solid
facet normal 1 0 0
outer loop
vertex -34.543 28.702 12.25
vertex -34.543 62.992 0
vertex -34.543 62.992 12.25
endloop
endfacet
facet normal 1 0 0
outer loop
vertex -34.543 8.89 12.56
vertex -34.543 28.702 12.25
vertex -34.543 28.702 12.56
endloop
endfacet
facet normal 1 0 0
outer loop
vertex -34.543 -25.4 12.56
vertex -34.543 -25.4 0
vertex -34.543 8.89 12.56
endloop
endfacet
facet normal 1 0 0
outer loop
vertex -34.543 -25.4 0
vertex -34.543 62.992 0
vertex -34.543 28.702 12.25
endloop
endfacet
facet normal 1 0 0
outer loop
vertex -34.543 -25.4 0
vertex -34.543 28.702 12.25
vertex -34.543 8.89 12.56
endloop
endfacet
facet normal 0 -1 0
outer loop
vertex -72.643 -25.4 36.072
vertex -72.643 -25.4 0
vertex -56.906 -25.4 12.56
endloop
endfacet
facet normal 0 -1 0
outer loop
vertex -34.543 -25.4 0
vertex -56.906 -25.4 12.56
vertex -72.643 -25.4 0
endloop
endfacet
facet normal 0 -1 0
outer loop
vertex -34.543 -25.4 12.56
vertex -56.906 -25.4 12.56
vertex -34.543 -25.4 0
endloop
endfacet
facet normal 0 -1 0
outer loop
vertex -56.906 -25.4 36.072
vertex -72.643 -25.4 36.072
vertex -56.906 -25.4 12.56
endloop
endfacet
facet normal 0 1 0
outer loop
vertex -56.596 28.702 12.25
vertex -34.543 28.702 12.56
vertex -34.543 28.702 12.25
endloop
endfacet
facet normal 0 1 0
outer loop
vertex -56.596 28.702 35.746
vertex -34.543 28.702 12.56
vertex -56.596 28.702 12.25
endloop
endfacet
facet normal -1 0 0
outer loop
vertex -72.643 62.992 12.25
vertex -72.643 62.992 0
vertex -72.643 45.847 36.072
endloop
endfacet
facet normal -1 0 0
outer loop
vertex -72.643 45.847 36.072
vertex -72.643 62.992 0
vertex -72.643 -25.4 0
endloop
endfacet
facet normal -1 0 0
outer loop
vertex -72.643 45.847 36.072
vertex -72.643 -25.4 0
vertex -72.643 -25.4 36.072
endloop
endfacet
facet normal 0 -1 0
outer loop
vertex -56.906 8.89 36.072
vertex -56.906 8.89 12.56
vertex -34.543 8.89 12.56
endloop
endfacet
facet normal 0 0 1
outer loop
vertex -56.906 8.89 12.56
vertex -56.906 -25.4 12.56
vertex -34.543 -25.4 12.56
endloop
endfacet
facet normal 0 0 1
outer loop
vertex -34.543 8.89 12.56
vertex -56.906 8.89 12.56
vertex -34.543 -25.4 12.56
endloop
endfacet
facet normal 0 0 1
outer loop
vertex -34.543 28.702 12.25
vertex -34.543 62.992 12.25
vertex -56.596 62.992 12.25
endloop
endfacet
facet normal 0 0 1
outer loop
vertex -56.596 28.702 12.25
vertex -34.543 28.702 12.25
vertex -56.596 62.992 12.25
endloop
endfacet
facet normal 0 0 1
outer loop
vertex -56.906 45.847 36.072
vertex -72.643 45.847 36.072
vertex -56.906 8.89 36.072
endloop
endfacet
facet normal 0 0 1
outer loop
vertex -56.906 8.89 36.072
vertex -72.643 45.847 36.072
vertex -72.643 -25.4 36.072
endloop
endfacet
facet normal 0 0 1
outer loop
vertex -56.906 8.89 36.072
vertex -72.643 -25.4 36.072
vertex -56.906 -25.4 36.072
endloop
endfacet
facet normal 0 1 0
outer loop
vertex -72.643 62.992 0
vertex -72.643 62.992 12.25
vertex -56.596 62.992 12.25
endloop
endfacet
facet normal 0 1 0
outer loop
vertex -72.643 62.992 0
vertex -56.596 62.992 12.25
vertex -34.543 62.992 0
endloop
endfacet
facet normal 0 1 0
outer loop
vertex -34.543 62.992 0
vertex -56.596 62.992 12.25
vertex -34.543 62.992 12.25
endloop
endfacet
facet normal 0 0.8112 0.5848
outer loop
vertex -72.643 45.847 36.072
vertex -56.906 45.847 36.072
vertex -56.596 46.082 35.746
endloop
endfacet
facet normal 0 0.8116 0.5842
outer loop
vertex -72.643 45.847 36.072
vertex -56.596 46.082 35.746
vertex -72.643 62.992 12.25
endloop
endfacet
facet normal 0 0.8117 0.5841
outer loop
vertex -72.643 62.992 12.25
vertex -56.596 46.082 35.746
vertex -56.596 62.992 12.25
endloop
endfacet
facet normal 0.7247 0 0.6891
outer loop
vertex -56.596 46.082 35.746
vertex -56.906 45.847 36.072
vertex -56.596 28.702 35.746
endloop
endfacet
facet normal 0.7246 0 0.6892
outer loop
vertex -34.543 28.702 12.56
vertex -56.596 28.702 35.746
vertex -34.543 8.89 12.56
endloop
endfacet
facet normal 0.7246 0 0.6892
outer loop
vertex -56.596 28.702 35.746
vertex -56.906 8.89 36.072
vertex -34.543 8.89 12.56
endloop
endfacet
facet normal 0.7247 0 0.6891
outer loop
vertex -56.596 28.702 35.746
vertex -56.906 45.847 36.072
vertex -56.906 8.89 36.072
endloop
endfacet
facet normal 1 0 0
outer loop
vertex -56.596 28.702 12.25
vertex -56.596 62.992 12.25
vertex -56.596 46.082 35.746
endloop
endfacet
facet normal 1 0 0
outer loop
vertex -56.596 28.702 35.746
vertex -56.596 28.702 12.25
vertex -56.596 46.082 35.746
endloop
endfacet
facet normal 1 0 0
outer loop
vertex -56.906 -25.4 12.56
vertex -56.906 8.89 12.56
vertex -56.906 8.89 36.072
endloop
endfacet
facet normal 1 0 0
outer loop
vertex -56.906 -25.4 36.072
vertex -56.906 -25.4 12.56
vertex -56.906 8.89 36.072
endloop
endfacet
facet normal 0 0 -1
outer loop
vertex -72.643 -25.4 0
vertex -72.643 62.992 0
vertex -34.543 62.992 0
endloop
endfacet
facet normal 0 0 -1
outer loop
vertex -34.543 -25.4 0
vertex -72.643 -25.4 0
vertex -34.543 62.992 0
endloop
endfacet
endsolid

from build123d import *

# Parameters (mm, degrees)
F0_W      = 63.5
F0_H      = 36.0719883448
F1_DEPTH  = 25.4
F2_DEPTH  = 62.992
F4_W      = 47.7636682294
F4_H      = 23.5122792056
F5_DEPTH  = 34.29
F3_W      = 47.4535489879
F3_H      = 23.8223956531
F6_DEPTH  = 34.29
F8_DEPTH  = 25.4
F9_DEPTH  = 25.4
F11_DEPTH = 41.402


with BuildPart() as f1:
    # F0 (on Front) → F1 (new body)
    with BuildSketch(Plane.XZ):
        with Locations((-40.8926705517, 18.0359941724)):
            Rectangle(F0_W, F0_H)
    extrude(amount=F1_DEPTH)

    # F2 (add): a face of the model
    f2_faces = [f1.faces().sort_by_distance(p)[0] for p in [
        (-40.8926705517, 0, 18.0359941724),
    ]]
    extrude(f2_faces, amount=F2_DEPTH)

    # F4 (on face) → F5 (cut)
    with BuildSketch(Plane.XZ.offset(25.4)):
        with Locations((-33.0245046664, 24.315848742)):
            Rectangle(F4_W, F4_H)
    extrude(amount=-F5_DEPTH, mode=Mode.SUBTRACT)

    # F3 (on face) → F6 (cut)
    with BuildSketch(Plane(origin=(0, 62.992, 0), x_dir=(-1, 0, 0), z_dir=(0, 1, 0))):
        with Locations((32.8694450457, 24.1607905182)):
            Rectangle(F3_W, F3_H)
    extrude(amount=-F6_DEPTH, mode=Mode.SUBTRACT)

    # F8 (cut): a face of the model
    f8_faces = [f1.faces().sort_by_distance(p)[0] for p in [
        (-9.1426705517, 18.6122366805, 11.6054298815),
    ]]
    extrude(f8_faces, amount=-F8_DEPTH, mode=Mode.SUBTRACT)

    # F7 (on face) → F9 (cut)
    with BuildSketch(Plane.YZ.offset(-56.5962195396)):
        Polygon((62.992, 36.0719883448), (45.847, 36.0719883448), (62.992, 12.2495926917), align=None)
    extrude(amount=-F9_DEPTH, mode=Mode.SUBTRACT)

    # F10 (on face) → F11 (cut)
    with BuildSketch(Plane.XZ.offset(-8.89)):
        Polygon((-34.5426705517, 36.0719883448), (-56.9063387811, 36.0719883448), (-34.5426705517, 12.5597091392), align=None)
    extrude(amount=-F11_DEPTH, mode=Mode.SUBTRACT)


solid = f1.part
